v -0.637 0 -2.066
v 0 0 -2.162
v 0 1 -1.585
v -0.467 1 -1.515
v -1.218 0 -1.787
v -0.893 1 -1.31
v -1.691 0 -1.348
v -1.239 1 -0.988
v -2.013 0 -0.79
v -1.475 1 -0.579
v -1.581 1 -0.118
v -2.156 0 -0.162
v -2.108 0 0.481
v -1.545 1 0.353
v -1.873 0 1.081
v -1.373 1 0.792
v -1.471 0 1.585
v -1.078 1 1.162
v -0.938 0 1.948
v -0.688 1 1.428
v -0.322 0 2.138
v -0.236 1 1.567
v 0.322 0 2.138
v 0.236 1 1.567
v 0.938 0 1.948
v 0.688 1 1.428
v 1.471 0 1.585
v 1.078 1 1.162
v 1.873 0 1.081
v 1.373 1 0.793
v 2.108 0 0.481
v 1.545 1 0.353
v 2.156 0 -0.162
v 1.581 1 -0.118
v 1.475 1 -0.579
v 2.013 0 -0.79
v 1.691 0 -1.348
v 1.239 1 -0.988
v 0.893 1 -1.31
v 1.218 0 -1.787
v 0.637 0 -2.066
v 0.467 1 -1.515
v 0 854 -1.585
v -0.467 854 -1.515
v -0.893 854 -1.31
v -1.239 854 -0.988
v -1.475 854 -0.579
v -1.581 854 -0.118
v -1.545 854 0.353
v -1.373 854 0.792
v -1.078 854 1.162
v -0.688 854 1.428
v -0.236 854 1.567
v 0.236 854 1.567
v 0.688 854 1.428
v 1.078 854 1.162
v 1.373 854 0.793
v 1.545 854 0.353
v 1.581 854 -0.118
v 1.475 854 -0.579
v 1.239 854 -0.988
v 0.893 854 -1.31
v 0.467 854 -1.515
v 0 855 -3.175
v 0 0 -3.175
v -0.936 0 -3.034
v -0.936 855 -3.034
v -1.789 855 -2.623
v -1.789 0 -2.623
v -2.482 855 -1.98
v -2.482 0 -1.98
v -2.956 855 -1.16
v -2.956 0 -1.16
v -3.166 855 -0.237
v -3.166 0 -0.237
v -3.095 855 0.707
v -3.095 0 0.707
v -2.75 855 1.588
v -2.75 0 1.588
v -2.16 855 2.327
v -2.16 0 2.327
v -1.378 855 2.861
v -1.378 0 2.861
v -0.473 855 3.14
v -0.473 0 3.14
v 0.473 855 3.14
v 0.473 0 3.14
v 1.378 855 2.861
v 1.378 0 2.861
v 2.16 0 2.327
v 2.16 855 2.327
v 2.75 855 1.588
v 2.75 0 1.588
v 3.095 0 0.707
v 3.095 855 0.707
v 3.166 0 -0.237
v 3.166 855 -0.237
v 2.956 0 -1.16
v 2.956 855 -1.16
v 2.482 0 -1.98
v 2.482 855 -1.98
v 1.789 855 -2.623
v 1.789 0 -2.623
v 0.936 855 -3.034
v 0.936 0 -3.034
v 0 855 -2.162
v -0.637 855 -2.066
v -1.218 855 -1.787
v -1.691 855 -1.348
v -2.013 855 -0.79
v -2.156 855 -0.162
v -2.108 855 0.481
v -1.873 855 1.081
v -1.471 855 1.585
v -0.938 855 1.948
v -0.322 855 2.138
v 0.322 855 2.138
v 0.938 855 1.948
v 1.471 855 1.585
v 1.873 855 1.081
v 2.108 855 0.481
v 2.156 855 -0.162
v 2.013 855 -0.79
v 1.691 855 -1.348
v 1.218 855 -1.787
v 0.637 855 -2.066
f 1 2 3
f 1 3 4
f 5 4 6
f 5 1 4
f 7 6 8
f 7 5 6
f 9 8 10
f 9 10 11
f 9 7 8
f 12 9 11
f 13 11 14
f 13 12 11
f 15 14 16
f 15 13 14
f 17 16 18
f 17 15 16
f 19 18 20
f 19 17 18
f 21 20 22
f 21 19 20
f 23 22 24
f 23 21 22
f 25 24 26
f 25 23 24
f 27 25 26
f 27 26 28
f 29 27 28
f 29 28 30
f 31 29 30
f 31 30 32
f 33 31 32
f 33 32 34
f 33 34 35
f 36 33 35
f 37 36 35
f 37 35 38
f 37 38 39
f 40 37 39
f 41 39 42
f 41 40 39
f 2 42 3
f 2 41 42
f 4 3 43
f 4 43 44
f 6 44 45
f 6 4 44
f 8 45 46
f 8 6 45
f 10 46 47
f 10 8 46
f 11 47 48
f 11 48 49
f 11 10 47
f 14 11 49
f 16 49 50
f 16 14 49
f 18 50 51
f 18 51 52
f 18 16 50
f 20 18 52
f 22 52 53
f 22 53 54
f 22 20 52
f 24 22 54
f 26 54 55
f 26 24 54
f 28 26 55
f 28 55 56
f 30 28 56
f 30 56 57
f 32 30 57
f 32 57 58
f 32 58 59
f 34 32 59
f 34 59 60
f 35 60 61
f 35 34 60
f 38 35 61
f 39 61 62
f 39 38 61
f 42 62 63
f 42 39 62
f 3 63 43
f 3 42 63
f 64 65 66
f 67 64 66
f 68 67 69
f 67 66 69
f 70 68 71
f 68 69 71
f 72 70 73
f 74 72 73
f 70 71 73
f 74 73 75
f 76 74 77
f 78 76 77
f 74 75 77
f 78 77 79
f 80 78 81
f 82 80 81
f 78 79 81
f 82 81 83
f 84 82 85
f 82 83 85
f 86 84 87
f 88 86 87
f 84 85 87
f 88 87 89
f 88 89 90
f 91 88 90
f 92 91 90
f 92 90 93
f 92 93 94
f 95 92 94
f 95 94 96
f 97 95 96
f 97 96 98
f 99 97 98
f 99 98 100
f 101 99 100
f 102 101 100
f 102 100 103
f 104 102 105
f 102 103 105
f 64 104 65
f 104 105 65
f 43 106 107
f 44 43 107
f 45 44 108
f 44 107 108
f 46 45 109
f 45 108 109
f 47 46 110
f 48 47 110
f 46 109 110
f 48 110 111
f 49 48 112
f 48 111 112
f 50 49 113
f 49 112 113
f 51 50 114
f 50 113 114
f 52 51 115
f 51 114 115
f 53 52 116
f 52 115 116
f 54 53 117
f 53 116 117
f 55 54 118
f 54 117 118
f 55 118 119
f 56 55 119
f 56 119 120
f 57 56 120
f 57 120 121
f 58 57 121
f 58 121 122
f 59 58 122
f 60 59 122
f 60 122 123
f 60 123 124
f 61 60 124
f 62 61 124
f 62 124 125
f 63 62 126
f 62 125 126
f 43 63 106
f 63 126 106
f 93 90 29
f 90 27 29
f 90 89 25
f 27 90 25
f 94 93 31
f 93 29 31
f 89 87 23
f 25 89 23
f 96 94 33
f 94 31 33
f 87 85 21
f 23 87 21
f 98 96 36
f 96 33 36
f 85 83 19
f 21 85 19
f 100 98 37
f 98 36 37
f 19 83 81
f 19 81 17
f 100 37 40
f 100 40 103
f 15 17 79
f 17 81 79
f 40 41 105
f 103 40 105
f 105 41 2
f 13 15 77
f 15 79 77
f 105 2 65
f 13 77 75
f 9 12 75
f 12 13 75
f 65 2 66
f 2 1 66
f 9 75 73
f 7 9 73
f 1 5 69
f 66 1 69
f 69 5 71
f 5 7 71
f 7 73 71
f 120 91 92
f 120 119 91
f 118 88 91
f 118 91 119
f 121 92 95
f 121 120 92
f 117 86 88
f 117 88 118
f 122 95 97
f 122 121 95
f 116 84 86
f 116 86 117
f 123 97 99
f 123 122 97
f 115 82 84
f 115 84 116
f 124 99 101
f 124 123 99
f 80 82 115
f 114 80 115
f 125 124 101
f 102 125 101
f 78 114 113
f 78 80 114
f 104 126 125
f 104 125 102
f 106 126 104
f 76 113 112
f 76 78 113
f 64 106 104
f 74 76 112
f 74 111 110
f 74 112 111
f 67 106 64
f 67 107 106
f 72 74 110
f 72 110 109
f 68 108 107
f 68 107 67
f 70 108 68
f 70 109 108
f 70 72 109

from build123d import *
from OCP.BRepFilletAPI import BRepFilletAPI_MakeChamfer

# Parameters (mm, degrees)
CROQUIS7_R              = 3.175
CROQUIS7_R_2            = 1.585
CHAFL_N2_SIZE           = 1
CHAFL_N2_SIZE2          = 0.577350269
CROQUIS7_3_R            = 3.175
CROQUIS7_3_R_2          = 1.585
SALIENTE_EXTRUIR2_DEPTH = 855
CHAFL_N3_SIZE           = 1
CHAFL_N3_SIZE2          = 0.577350269


with BuildPart() as part:
    # Barrer4: sweep along a path in Croquis6
    with BuildLine(Plane.XY) as barrer4_path:
        Line((0, 0), (0, 100))
        ThreePointArc((0, 100), (3.620568169, 173.605324125), (14.447316639, 246.5))
        ThreePointArc((14.447316639, 246.5), (208.645238435, 390.471063639), (370.979960645, 211.34))
        Line((370.979960645, 211.34), (370.979960645, 86))
    # Croquis7 → Barrer4 (sweep)
    with BuildSketch(Plane(origin=(0, 0, 0), x_dir=(1, 0, 0), z_dir=(0, 1, 0))):
        Circle(CROQUIS7_R)
        Circle(CROQUIS7_R_2, mode=Mode.SUBTRACT)
    sweep(path=barrer4_path.line)

    # Chaflán2: one chamfer whose edges measure the first distance from different faces: ONE call of the kernel's chamfer builder (chamfer() names one face for all edges)
    chafl_n2_edges_1 = [part.edges().sort_by_distance(p)[0] for p in [
        (-1.585, 0, 0),
    ]]
    chafl_n2_side_1 = [part.faces().sort_by_distance(p)[0] for p in [
        (-1.585, 50, 0),
    ]]
    chafl_n2_edges_2 = [part.edges().sort_by_distance(p)[0] for p in [
        (372.564960645, 86, 0),
    ]]
    chafl_n2_side_2 = [part.faces().sort_by_distance(p)[0] for p in [
        (372.564960645, 148.67, 0),
    ]]
    chafl_n2 = BRepFilletAPI_MakeChamfer(part.part.solid().wrapped)
    for e in chafl_n2_edges_1:
        chafl_n2.Add(CHAFL_N2_SIZE, CHAFL_N2_SIZE2, e.wrapped, chafl_n2_side_1[0].wrapped)  # the first distance lies on this face
    for e in chafl_n2_edges_2:
        chafl_n2.Add(CHAFL_N2_SIZE, CHAFL_N2_SIZE2, e.wrapped, chafl_n2_side_2[0].wrapped)  # the first distance lies on this face
    add(Compound.cast(chafl_n2.Shape()), mode=Mode.REPLACE)


with BuildPart() as body_2:
    # Croquis7<3> → Saliente-Extruir2 (new body)
    with BuildSketch(Plane(origin=(0, 0, 0), x_dir=(1, 0, 0), z_dir=(0, 1, 0))):
        Circle(CROQUIS7_3_R)
        Circle(CROQUIS7_3_R_2, mode=Mode.SUBTRACT)
    extrude(amount=SALIENTE_EXTRUIR2_DEPTH)

    # Chaflán3
    chafl_n3_edges = [body_2.edges().sort_by_distance(p)[0] for p in [
        (-1.585, 0, 0),
        (-1.585, 855, 0),
    ]]
    chafl_n3_side = [body_2.faces().sort_by_distance(p)[0] for p in [
        (-1.585, 427.5, 0),
    ]]
    chamfer(chafl_n3_edges, length=CHAFL_N3_SIZE, length2=CHAFL_N3_SIZE2, reference=chafl_n3_side[0])


solid = body_2.part
